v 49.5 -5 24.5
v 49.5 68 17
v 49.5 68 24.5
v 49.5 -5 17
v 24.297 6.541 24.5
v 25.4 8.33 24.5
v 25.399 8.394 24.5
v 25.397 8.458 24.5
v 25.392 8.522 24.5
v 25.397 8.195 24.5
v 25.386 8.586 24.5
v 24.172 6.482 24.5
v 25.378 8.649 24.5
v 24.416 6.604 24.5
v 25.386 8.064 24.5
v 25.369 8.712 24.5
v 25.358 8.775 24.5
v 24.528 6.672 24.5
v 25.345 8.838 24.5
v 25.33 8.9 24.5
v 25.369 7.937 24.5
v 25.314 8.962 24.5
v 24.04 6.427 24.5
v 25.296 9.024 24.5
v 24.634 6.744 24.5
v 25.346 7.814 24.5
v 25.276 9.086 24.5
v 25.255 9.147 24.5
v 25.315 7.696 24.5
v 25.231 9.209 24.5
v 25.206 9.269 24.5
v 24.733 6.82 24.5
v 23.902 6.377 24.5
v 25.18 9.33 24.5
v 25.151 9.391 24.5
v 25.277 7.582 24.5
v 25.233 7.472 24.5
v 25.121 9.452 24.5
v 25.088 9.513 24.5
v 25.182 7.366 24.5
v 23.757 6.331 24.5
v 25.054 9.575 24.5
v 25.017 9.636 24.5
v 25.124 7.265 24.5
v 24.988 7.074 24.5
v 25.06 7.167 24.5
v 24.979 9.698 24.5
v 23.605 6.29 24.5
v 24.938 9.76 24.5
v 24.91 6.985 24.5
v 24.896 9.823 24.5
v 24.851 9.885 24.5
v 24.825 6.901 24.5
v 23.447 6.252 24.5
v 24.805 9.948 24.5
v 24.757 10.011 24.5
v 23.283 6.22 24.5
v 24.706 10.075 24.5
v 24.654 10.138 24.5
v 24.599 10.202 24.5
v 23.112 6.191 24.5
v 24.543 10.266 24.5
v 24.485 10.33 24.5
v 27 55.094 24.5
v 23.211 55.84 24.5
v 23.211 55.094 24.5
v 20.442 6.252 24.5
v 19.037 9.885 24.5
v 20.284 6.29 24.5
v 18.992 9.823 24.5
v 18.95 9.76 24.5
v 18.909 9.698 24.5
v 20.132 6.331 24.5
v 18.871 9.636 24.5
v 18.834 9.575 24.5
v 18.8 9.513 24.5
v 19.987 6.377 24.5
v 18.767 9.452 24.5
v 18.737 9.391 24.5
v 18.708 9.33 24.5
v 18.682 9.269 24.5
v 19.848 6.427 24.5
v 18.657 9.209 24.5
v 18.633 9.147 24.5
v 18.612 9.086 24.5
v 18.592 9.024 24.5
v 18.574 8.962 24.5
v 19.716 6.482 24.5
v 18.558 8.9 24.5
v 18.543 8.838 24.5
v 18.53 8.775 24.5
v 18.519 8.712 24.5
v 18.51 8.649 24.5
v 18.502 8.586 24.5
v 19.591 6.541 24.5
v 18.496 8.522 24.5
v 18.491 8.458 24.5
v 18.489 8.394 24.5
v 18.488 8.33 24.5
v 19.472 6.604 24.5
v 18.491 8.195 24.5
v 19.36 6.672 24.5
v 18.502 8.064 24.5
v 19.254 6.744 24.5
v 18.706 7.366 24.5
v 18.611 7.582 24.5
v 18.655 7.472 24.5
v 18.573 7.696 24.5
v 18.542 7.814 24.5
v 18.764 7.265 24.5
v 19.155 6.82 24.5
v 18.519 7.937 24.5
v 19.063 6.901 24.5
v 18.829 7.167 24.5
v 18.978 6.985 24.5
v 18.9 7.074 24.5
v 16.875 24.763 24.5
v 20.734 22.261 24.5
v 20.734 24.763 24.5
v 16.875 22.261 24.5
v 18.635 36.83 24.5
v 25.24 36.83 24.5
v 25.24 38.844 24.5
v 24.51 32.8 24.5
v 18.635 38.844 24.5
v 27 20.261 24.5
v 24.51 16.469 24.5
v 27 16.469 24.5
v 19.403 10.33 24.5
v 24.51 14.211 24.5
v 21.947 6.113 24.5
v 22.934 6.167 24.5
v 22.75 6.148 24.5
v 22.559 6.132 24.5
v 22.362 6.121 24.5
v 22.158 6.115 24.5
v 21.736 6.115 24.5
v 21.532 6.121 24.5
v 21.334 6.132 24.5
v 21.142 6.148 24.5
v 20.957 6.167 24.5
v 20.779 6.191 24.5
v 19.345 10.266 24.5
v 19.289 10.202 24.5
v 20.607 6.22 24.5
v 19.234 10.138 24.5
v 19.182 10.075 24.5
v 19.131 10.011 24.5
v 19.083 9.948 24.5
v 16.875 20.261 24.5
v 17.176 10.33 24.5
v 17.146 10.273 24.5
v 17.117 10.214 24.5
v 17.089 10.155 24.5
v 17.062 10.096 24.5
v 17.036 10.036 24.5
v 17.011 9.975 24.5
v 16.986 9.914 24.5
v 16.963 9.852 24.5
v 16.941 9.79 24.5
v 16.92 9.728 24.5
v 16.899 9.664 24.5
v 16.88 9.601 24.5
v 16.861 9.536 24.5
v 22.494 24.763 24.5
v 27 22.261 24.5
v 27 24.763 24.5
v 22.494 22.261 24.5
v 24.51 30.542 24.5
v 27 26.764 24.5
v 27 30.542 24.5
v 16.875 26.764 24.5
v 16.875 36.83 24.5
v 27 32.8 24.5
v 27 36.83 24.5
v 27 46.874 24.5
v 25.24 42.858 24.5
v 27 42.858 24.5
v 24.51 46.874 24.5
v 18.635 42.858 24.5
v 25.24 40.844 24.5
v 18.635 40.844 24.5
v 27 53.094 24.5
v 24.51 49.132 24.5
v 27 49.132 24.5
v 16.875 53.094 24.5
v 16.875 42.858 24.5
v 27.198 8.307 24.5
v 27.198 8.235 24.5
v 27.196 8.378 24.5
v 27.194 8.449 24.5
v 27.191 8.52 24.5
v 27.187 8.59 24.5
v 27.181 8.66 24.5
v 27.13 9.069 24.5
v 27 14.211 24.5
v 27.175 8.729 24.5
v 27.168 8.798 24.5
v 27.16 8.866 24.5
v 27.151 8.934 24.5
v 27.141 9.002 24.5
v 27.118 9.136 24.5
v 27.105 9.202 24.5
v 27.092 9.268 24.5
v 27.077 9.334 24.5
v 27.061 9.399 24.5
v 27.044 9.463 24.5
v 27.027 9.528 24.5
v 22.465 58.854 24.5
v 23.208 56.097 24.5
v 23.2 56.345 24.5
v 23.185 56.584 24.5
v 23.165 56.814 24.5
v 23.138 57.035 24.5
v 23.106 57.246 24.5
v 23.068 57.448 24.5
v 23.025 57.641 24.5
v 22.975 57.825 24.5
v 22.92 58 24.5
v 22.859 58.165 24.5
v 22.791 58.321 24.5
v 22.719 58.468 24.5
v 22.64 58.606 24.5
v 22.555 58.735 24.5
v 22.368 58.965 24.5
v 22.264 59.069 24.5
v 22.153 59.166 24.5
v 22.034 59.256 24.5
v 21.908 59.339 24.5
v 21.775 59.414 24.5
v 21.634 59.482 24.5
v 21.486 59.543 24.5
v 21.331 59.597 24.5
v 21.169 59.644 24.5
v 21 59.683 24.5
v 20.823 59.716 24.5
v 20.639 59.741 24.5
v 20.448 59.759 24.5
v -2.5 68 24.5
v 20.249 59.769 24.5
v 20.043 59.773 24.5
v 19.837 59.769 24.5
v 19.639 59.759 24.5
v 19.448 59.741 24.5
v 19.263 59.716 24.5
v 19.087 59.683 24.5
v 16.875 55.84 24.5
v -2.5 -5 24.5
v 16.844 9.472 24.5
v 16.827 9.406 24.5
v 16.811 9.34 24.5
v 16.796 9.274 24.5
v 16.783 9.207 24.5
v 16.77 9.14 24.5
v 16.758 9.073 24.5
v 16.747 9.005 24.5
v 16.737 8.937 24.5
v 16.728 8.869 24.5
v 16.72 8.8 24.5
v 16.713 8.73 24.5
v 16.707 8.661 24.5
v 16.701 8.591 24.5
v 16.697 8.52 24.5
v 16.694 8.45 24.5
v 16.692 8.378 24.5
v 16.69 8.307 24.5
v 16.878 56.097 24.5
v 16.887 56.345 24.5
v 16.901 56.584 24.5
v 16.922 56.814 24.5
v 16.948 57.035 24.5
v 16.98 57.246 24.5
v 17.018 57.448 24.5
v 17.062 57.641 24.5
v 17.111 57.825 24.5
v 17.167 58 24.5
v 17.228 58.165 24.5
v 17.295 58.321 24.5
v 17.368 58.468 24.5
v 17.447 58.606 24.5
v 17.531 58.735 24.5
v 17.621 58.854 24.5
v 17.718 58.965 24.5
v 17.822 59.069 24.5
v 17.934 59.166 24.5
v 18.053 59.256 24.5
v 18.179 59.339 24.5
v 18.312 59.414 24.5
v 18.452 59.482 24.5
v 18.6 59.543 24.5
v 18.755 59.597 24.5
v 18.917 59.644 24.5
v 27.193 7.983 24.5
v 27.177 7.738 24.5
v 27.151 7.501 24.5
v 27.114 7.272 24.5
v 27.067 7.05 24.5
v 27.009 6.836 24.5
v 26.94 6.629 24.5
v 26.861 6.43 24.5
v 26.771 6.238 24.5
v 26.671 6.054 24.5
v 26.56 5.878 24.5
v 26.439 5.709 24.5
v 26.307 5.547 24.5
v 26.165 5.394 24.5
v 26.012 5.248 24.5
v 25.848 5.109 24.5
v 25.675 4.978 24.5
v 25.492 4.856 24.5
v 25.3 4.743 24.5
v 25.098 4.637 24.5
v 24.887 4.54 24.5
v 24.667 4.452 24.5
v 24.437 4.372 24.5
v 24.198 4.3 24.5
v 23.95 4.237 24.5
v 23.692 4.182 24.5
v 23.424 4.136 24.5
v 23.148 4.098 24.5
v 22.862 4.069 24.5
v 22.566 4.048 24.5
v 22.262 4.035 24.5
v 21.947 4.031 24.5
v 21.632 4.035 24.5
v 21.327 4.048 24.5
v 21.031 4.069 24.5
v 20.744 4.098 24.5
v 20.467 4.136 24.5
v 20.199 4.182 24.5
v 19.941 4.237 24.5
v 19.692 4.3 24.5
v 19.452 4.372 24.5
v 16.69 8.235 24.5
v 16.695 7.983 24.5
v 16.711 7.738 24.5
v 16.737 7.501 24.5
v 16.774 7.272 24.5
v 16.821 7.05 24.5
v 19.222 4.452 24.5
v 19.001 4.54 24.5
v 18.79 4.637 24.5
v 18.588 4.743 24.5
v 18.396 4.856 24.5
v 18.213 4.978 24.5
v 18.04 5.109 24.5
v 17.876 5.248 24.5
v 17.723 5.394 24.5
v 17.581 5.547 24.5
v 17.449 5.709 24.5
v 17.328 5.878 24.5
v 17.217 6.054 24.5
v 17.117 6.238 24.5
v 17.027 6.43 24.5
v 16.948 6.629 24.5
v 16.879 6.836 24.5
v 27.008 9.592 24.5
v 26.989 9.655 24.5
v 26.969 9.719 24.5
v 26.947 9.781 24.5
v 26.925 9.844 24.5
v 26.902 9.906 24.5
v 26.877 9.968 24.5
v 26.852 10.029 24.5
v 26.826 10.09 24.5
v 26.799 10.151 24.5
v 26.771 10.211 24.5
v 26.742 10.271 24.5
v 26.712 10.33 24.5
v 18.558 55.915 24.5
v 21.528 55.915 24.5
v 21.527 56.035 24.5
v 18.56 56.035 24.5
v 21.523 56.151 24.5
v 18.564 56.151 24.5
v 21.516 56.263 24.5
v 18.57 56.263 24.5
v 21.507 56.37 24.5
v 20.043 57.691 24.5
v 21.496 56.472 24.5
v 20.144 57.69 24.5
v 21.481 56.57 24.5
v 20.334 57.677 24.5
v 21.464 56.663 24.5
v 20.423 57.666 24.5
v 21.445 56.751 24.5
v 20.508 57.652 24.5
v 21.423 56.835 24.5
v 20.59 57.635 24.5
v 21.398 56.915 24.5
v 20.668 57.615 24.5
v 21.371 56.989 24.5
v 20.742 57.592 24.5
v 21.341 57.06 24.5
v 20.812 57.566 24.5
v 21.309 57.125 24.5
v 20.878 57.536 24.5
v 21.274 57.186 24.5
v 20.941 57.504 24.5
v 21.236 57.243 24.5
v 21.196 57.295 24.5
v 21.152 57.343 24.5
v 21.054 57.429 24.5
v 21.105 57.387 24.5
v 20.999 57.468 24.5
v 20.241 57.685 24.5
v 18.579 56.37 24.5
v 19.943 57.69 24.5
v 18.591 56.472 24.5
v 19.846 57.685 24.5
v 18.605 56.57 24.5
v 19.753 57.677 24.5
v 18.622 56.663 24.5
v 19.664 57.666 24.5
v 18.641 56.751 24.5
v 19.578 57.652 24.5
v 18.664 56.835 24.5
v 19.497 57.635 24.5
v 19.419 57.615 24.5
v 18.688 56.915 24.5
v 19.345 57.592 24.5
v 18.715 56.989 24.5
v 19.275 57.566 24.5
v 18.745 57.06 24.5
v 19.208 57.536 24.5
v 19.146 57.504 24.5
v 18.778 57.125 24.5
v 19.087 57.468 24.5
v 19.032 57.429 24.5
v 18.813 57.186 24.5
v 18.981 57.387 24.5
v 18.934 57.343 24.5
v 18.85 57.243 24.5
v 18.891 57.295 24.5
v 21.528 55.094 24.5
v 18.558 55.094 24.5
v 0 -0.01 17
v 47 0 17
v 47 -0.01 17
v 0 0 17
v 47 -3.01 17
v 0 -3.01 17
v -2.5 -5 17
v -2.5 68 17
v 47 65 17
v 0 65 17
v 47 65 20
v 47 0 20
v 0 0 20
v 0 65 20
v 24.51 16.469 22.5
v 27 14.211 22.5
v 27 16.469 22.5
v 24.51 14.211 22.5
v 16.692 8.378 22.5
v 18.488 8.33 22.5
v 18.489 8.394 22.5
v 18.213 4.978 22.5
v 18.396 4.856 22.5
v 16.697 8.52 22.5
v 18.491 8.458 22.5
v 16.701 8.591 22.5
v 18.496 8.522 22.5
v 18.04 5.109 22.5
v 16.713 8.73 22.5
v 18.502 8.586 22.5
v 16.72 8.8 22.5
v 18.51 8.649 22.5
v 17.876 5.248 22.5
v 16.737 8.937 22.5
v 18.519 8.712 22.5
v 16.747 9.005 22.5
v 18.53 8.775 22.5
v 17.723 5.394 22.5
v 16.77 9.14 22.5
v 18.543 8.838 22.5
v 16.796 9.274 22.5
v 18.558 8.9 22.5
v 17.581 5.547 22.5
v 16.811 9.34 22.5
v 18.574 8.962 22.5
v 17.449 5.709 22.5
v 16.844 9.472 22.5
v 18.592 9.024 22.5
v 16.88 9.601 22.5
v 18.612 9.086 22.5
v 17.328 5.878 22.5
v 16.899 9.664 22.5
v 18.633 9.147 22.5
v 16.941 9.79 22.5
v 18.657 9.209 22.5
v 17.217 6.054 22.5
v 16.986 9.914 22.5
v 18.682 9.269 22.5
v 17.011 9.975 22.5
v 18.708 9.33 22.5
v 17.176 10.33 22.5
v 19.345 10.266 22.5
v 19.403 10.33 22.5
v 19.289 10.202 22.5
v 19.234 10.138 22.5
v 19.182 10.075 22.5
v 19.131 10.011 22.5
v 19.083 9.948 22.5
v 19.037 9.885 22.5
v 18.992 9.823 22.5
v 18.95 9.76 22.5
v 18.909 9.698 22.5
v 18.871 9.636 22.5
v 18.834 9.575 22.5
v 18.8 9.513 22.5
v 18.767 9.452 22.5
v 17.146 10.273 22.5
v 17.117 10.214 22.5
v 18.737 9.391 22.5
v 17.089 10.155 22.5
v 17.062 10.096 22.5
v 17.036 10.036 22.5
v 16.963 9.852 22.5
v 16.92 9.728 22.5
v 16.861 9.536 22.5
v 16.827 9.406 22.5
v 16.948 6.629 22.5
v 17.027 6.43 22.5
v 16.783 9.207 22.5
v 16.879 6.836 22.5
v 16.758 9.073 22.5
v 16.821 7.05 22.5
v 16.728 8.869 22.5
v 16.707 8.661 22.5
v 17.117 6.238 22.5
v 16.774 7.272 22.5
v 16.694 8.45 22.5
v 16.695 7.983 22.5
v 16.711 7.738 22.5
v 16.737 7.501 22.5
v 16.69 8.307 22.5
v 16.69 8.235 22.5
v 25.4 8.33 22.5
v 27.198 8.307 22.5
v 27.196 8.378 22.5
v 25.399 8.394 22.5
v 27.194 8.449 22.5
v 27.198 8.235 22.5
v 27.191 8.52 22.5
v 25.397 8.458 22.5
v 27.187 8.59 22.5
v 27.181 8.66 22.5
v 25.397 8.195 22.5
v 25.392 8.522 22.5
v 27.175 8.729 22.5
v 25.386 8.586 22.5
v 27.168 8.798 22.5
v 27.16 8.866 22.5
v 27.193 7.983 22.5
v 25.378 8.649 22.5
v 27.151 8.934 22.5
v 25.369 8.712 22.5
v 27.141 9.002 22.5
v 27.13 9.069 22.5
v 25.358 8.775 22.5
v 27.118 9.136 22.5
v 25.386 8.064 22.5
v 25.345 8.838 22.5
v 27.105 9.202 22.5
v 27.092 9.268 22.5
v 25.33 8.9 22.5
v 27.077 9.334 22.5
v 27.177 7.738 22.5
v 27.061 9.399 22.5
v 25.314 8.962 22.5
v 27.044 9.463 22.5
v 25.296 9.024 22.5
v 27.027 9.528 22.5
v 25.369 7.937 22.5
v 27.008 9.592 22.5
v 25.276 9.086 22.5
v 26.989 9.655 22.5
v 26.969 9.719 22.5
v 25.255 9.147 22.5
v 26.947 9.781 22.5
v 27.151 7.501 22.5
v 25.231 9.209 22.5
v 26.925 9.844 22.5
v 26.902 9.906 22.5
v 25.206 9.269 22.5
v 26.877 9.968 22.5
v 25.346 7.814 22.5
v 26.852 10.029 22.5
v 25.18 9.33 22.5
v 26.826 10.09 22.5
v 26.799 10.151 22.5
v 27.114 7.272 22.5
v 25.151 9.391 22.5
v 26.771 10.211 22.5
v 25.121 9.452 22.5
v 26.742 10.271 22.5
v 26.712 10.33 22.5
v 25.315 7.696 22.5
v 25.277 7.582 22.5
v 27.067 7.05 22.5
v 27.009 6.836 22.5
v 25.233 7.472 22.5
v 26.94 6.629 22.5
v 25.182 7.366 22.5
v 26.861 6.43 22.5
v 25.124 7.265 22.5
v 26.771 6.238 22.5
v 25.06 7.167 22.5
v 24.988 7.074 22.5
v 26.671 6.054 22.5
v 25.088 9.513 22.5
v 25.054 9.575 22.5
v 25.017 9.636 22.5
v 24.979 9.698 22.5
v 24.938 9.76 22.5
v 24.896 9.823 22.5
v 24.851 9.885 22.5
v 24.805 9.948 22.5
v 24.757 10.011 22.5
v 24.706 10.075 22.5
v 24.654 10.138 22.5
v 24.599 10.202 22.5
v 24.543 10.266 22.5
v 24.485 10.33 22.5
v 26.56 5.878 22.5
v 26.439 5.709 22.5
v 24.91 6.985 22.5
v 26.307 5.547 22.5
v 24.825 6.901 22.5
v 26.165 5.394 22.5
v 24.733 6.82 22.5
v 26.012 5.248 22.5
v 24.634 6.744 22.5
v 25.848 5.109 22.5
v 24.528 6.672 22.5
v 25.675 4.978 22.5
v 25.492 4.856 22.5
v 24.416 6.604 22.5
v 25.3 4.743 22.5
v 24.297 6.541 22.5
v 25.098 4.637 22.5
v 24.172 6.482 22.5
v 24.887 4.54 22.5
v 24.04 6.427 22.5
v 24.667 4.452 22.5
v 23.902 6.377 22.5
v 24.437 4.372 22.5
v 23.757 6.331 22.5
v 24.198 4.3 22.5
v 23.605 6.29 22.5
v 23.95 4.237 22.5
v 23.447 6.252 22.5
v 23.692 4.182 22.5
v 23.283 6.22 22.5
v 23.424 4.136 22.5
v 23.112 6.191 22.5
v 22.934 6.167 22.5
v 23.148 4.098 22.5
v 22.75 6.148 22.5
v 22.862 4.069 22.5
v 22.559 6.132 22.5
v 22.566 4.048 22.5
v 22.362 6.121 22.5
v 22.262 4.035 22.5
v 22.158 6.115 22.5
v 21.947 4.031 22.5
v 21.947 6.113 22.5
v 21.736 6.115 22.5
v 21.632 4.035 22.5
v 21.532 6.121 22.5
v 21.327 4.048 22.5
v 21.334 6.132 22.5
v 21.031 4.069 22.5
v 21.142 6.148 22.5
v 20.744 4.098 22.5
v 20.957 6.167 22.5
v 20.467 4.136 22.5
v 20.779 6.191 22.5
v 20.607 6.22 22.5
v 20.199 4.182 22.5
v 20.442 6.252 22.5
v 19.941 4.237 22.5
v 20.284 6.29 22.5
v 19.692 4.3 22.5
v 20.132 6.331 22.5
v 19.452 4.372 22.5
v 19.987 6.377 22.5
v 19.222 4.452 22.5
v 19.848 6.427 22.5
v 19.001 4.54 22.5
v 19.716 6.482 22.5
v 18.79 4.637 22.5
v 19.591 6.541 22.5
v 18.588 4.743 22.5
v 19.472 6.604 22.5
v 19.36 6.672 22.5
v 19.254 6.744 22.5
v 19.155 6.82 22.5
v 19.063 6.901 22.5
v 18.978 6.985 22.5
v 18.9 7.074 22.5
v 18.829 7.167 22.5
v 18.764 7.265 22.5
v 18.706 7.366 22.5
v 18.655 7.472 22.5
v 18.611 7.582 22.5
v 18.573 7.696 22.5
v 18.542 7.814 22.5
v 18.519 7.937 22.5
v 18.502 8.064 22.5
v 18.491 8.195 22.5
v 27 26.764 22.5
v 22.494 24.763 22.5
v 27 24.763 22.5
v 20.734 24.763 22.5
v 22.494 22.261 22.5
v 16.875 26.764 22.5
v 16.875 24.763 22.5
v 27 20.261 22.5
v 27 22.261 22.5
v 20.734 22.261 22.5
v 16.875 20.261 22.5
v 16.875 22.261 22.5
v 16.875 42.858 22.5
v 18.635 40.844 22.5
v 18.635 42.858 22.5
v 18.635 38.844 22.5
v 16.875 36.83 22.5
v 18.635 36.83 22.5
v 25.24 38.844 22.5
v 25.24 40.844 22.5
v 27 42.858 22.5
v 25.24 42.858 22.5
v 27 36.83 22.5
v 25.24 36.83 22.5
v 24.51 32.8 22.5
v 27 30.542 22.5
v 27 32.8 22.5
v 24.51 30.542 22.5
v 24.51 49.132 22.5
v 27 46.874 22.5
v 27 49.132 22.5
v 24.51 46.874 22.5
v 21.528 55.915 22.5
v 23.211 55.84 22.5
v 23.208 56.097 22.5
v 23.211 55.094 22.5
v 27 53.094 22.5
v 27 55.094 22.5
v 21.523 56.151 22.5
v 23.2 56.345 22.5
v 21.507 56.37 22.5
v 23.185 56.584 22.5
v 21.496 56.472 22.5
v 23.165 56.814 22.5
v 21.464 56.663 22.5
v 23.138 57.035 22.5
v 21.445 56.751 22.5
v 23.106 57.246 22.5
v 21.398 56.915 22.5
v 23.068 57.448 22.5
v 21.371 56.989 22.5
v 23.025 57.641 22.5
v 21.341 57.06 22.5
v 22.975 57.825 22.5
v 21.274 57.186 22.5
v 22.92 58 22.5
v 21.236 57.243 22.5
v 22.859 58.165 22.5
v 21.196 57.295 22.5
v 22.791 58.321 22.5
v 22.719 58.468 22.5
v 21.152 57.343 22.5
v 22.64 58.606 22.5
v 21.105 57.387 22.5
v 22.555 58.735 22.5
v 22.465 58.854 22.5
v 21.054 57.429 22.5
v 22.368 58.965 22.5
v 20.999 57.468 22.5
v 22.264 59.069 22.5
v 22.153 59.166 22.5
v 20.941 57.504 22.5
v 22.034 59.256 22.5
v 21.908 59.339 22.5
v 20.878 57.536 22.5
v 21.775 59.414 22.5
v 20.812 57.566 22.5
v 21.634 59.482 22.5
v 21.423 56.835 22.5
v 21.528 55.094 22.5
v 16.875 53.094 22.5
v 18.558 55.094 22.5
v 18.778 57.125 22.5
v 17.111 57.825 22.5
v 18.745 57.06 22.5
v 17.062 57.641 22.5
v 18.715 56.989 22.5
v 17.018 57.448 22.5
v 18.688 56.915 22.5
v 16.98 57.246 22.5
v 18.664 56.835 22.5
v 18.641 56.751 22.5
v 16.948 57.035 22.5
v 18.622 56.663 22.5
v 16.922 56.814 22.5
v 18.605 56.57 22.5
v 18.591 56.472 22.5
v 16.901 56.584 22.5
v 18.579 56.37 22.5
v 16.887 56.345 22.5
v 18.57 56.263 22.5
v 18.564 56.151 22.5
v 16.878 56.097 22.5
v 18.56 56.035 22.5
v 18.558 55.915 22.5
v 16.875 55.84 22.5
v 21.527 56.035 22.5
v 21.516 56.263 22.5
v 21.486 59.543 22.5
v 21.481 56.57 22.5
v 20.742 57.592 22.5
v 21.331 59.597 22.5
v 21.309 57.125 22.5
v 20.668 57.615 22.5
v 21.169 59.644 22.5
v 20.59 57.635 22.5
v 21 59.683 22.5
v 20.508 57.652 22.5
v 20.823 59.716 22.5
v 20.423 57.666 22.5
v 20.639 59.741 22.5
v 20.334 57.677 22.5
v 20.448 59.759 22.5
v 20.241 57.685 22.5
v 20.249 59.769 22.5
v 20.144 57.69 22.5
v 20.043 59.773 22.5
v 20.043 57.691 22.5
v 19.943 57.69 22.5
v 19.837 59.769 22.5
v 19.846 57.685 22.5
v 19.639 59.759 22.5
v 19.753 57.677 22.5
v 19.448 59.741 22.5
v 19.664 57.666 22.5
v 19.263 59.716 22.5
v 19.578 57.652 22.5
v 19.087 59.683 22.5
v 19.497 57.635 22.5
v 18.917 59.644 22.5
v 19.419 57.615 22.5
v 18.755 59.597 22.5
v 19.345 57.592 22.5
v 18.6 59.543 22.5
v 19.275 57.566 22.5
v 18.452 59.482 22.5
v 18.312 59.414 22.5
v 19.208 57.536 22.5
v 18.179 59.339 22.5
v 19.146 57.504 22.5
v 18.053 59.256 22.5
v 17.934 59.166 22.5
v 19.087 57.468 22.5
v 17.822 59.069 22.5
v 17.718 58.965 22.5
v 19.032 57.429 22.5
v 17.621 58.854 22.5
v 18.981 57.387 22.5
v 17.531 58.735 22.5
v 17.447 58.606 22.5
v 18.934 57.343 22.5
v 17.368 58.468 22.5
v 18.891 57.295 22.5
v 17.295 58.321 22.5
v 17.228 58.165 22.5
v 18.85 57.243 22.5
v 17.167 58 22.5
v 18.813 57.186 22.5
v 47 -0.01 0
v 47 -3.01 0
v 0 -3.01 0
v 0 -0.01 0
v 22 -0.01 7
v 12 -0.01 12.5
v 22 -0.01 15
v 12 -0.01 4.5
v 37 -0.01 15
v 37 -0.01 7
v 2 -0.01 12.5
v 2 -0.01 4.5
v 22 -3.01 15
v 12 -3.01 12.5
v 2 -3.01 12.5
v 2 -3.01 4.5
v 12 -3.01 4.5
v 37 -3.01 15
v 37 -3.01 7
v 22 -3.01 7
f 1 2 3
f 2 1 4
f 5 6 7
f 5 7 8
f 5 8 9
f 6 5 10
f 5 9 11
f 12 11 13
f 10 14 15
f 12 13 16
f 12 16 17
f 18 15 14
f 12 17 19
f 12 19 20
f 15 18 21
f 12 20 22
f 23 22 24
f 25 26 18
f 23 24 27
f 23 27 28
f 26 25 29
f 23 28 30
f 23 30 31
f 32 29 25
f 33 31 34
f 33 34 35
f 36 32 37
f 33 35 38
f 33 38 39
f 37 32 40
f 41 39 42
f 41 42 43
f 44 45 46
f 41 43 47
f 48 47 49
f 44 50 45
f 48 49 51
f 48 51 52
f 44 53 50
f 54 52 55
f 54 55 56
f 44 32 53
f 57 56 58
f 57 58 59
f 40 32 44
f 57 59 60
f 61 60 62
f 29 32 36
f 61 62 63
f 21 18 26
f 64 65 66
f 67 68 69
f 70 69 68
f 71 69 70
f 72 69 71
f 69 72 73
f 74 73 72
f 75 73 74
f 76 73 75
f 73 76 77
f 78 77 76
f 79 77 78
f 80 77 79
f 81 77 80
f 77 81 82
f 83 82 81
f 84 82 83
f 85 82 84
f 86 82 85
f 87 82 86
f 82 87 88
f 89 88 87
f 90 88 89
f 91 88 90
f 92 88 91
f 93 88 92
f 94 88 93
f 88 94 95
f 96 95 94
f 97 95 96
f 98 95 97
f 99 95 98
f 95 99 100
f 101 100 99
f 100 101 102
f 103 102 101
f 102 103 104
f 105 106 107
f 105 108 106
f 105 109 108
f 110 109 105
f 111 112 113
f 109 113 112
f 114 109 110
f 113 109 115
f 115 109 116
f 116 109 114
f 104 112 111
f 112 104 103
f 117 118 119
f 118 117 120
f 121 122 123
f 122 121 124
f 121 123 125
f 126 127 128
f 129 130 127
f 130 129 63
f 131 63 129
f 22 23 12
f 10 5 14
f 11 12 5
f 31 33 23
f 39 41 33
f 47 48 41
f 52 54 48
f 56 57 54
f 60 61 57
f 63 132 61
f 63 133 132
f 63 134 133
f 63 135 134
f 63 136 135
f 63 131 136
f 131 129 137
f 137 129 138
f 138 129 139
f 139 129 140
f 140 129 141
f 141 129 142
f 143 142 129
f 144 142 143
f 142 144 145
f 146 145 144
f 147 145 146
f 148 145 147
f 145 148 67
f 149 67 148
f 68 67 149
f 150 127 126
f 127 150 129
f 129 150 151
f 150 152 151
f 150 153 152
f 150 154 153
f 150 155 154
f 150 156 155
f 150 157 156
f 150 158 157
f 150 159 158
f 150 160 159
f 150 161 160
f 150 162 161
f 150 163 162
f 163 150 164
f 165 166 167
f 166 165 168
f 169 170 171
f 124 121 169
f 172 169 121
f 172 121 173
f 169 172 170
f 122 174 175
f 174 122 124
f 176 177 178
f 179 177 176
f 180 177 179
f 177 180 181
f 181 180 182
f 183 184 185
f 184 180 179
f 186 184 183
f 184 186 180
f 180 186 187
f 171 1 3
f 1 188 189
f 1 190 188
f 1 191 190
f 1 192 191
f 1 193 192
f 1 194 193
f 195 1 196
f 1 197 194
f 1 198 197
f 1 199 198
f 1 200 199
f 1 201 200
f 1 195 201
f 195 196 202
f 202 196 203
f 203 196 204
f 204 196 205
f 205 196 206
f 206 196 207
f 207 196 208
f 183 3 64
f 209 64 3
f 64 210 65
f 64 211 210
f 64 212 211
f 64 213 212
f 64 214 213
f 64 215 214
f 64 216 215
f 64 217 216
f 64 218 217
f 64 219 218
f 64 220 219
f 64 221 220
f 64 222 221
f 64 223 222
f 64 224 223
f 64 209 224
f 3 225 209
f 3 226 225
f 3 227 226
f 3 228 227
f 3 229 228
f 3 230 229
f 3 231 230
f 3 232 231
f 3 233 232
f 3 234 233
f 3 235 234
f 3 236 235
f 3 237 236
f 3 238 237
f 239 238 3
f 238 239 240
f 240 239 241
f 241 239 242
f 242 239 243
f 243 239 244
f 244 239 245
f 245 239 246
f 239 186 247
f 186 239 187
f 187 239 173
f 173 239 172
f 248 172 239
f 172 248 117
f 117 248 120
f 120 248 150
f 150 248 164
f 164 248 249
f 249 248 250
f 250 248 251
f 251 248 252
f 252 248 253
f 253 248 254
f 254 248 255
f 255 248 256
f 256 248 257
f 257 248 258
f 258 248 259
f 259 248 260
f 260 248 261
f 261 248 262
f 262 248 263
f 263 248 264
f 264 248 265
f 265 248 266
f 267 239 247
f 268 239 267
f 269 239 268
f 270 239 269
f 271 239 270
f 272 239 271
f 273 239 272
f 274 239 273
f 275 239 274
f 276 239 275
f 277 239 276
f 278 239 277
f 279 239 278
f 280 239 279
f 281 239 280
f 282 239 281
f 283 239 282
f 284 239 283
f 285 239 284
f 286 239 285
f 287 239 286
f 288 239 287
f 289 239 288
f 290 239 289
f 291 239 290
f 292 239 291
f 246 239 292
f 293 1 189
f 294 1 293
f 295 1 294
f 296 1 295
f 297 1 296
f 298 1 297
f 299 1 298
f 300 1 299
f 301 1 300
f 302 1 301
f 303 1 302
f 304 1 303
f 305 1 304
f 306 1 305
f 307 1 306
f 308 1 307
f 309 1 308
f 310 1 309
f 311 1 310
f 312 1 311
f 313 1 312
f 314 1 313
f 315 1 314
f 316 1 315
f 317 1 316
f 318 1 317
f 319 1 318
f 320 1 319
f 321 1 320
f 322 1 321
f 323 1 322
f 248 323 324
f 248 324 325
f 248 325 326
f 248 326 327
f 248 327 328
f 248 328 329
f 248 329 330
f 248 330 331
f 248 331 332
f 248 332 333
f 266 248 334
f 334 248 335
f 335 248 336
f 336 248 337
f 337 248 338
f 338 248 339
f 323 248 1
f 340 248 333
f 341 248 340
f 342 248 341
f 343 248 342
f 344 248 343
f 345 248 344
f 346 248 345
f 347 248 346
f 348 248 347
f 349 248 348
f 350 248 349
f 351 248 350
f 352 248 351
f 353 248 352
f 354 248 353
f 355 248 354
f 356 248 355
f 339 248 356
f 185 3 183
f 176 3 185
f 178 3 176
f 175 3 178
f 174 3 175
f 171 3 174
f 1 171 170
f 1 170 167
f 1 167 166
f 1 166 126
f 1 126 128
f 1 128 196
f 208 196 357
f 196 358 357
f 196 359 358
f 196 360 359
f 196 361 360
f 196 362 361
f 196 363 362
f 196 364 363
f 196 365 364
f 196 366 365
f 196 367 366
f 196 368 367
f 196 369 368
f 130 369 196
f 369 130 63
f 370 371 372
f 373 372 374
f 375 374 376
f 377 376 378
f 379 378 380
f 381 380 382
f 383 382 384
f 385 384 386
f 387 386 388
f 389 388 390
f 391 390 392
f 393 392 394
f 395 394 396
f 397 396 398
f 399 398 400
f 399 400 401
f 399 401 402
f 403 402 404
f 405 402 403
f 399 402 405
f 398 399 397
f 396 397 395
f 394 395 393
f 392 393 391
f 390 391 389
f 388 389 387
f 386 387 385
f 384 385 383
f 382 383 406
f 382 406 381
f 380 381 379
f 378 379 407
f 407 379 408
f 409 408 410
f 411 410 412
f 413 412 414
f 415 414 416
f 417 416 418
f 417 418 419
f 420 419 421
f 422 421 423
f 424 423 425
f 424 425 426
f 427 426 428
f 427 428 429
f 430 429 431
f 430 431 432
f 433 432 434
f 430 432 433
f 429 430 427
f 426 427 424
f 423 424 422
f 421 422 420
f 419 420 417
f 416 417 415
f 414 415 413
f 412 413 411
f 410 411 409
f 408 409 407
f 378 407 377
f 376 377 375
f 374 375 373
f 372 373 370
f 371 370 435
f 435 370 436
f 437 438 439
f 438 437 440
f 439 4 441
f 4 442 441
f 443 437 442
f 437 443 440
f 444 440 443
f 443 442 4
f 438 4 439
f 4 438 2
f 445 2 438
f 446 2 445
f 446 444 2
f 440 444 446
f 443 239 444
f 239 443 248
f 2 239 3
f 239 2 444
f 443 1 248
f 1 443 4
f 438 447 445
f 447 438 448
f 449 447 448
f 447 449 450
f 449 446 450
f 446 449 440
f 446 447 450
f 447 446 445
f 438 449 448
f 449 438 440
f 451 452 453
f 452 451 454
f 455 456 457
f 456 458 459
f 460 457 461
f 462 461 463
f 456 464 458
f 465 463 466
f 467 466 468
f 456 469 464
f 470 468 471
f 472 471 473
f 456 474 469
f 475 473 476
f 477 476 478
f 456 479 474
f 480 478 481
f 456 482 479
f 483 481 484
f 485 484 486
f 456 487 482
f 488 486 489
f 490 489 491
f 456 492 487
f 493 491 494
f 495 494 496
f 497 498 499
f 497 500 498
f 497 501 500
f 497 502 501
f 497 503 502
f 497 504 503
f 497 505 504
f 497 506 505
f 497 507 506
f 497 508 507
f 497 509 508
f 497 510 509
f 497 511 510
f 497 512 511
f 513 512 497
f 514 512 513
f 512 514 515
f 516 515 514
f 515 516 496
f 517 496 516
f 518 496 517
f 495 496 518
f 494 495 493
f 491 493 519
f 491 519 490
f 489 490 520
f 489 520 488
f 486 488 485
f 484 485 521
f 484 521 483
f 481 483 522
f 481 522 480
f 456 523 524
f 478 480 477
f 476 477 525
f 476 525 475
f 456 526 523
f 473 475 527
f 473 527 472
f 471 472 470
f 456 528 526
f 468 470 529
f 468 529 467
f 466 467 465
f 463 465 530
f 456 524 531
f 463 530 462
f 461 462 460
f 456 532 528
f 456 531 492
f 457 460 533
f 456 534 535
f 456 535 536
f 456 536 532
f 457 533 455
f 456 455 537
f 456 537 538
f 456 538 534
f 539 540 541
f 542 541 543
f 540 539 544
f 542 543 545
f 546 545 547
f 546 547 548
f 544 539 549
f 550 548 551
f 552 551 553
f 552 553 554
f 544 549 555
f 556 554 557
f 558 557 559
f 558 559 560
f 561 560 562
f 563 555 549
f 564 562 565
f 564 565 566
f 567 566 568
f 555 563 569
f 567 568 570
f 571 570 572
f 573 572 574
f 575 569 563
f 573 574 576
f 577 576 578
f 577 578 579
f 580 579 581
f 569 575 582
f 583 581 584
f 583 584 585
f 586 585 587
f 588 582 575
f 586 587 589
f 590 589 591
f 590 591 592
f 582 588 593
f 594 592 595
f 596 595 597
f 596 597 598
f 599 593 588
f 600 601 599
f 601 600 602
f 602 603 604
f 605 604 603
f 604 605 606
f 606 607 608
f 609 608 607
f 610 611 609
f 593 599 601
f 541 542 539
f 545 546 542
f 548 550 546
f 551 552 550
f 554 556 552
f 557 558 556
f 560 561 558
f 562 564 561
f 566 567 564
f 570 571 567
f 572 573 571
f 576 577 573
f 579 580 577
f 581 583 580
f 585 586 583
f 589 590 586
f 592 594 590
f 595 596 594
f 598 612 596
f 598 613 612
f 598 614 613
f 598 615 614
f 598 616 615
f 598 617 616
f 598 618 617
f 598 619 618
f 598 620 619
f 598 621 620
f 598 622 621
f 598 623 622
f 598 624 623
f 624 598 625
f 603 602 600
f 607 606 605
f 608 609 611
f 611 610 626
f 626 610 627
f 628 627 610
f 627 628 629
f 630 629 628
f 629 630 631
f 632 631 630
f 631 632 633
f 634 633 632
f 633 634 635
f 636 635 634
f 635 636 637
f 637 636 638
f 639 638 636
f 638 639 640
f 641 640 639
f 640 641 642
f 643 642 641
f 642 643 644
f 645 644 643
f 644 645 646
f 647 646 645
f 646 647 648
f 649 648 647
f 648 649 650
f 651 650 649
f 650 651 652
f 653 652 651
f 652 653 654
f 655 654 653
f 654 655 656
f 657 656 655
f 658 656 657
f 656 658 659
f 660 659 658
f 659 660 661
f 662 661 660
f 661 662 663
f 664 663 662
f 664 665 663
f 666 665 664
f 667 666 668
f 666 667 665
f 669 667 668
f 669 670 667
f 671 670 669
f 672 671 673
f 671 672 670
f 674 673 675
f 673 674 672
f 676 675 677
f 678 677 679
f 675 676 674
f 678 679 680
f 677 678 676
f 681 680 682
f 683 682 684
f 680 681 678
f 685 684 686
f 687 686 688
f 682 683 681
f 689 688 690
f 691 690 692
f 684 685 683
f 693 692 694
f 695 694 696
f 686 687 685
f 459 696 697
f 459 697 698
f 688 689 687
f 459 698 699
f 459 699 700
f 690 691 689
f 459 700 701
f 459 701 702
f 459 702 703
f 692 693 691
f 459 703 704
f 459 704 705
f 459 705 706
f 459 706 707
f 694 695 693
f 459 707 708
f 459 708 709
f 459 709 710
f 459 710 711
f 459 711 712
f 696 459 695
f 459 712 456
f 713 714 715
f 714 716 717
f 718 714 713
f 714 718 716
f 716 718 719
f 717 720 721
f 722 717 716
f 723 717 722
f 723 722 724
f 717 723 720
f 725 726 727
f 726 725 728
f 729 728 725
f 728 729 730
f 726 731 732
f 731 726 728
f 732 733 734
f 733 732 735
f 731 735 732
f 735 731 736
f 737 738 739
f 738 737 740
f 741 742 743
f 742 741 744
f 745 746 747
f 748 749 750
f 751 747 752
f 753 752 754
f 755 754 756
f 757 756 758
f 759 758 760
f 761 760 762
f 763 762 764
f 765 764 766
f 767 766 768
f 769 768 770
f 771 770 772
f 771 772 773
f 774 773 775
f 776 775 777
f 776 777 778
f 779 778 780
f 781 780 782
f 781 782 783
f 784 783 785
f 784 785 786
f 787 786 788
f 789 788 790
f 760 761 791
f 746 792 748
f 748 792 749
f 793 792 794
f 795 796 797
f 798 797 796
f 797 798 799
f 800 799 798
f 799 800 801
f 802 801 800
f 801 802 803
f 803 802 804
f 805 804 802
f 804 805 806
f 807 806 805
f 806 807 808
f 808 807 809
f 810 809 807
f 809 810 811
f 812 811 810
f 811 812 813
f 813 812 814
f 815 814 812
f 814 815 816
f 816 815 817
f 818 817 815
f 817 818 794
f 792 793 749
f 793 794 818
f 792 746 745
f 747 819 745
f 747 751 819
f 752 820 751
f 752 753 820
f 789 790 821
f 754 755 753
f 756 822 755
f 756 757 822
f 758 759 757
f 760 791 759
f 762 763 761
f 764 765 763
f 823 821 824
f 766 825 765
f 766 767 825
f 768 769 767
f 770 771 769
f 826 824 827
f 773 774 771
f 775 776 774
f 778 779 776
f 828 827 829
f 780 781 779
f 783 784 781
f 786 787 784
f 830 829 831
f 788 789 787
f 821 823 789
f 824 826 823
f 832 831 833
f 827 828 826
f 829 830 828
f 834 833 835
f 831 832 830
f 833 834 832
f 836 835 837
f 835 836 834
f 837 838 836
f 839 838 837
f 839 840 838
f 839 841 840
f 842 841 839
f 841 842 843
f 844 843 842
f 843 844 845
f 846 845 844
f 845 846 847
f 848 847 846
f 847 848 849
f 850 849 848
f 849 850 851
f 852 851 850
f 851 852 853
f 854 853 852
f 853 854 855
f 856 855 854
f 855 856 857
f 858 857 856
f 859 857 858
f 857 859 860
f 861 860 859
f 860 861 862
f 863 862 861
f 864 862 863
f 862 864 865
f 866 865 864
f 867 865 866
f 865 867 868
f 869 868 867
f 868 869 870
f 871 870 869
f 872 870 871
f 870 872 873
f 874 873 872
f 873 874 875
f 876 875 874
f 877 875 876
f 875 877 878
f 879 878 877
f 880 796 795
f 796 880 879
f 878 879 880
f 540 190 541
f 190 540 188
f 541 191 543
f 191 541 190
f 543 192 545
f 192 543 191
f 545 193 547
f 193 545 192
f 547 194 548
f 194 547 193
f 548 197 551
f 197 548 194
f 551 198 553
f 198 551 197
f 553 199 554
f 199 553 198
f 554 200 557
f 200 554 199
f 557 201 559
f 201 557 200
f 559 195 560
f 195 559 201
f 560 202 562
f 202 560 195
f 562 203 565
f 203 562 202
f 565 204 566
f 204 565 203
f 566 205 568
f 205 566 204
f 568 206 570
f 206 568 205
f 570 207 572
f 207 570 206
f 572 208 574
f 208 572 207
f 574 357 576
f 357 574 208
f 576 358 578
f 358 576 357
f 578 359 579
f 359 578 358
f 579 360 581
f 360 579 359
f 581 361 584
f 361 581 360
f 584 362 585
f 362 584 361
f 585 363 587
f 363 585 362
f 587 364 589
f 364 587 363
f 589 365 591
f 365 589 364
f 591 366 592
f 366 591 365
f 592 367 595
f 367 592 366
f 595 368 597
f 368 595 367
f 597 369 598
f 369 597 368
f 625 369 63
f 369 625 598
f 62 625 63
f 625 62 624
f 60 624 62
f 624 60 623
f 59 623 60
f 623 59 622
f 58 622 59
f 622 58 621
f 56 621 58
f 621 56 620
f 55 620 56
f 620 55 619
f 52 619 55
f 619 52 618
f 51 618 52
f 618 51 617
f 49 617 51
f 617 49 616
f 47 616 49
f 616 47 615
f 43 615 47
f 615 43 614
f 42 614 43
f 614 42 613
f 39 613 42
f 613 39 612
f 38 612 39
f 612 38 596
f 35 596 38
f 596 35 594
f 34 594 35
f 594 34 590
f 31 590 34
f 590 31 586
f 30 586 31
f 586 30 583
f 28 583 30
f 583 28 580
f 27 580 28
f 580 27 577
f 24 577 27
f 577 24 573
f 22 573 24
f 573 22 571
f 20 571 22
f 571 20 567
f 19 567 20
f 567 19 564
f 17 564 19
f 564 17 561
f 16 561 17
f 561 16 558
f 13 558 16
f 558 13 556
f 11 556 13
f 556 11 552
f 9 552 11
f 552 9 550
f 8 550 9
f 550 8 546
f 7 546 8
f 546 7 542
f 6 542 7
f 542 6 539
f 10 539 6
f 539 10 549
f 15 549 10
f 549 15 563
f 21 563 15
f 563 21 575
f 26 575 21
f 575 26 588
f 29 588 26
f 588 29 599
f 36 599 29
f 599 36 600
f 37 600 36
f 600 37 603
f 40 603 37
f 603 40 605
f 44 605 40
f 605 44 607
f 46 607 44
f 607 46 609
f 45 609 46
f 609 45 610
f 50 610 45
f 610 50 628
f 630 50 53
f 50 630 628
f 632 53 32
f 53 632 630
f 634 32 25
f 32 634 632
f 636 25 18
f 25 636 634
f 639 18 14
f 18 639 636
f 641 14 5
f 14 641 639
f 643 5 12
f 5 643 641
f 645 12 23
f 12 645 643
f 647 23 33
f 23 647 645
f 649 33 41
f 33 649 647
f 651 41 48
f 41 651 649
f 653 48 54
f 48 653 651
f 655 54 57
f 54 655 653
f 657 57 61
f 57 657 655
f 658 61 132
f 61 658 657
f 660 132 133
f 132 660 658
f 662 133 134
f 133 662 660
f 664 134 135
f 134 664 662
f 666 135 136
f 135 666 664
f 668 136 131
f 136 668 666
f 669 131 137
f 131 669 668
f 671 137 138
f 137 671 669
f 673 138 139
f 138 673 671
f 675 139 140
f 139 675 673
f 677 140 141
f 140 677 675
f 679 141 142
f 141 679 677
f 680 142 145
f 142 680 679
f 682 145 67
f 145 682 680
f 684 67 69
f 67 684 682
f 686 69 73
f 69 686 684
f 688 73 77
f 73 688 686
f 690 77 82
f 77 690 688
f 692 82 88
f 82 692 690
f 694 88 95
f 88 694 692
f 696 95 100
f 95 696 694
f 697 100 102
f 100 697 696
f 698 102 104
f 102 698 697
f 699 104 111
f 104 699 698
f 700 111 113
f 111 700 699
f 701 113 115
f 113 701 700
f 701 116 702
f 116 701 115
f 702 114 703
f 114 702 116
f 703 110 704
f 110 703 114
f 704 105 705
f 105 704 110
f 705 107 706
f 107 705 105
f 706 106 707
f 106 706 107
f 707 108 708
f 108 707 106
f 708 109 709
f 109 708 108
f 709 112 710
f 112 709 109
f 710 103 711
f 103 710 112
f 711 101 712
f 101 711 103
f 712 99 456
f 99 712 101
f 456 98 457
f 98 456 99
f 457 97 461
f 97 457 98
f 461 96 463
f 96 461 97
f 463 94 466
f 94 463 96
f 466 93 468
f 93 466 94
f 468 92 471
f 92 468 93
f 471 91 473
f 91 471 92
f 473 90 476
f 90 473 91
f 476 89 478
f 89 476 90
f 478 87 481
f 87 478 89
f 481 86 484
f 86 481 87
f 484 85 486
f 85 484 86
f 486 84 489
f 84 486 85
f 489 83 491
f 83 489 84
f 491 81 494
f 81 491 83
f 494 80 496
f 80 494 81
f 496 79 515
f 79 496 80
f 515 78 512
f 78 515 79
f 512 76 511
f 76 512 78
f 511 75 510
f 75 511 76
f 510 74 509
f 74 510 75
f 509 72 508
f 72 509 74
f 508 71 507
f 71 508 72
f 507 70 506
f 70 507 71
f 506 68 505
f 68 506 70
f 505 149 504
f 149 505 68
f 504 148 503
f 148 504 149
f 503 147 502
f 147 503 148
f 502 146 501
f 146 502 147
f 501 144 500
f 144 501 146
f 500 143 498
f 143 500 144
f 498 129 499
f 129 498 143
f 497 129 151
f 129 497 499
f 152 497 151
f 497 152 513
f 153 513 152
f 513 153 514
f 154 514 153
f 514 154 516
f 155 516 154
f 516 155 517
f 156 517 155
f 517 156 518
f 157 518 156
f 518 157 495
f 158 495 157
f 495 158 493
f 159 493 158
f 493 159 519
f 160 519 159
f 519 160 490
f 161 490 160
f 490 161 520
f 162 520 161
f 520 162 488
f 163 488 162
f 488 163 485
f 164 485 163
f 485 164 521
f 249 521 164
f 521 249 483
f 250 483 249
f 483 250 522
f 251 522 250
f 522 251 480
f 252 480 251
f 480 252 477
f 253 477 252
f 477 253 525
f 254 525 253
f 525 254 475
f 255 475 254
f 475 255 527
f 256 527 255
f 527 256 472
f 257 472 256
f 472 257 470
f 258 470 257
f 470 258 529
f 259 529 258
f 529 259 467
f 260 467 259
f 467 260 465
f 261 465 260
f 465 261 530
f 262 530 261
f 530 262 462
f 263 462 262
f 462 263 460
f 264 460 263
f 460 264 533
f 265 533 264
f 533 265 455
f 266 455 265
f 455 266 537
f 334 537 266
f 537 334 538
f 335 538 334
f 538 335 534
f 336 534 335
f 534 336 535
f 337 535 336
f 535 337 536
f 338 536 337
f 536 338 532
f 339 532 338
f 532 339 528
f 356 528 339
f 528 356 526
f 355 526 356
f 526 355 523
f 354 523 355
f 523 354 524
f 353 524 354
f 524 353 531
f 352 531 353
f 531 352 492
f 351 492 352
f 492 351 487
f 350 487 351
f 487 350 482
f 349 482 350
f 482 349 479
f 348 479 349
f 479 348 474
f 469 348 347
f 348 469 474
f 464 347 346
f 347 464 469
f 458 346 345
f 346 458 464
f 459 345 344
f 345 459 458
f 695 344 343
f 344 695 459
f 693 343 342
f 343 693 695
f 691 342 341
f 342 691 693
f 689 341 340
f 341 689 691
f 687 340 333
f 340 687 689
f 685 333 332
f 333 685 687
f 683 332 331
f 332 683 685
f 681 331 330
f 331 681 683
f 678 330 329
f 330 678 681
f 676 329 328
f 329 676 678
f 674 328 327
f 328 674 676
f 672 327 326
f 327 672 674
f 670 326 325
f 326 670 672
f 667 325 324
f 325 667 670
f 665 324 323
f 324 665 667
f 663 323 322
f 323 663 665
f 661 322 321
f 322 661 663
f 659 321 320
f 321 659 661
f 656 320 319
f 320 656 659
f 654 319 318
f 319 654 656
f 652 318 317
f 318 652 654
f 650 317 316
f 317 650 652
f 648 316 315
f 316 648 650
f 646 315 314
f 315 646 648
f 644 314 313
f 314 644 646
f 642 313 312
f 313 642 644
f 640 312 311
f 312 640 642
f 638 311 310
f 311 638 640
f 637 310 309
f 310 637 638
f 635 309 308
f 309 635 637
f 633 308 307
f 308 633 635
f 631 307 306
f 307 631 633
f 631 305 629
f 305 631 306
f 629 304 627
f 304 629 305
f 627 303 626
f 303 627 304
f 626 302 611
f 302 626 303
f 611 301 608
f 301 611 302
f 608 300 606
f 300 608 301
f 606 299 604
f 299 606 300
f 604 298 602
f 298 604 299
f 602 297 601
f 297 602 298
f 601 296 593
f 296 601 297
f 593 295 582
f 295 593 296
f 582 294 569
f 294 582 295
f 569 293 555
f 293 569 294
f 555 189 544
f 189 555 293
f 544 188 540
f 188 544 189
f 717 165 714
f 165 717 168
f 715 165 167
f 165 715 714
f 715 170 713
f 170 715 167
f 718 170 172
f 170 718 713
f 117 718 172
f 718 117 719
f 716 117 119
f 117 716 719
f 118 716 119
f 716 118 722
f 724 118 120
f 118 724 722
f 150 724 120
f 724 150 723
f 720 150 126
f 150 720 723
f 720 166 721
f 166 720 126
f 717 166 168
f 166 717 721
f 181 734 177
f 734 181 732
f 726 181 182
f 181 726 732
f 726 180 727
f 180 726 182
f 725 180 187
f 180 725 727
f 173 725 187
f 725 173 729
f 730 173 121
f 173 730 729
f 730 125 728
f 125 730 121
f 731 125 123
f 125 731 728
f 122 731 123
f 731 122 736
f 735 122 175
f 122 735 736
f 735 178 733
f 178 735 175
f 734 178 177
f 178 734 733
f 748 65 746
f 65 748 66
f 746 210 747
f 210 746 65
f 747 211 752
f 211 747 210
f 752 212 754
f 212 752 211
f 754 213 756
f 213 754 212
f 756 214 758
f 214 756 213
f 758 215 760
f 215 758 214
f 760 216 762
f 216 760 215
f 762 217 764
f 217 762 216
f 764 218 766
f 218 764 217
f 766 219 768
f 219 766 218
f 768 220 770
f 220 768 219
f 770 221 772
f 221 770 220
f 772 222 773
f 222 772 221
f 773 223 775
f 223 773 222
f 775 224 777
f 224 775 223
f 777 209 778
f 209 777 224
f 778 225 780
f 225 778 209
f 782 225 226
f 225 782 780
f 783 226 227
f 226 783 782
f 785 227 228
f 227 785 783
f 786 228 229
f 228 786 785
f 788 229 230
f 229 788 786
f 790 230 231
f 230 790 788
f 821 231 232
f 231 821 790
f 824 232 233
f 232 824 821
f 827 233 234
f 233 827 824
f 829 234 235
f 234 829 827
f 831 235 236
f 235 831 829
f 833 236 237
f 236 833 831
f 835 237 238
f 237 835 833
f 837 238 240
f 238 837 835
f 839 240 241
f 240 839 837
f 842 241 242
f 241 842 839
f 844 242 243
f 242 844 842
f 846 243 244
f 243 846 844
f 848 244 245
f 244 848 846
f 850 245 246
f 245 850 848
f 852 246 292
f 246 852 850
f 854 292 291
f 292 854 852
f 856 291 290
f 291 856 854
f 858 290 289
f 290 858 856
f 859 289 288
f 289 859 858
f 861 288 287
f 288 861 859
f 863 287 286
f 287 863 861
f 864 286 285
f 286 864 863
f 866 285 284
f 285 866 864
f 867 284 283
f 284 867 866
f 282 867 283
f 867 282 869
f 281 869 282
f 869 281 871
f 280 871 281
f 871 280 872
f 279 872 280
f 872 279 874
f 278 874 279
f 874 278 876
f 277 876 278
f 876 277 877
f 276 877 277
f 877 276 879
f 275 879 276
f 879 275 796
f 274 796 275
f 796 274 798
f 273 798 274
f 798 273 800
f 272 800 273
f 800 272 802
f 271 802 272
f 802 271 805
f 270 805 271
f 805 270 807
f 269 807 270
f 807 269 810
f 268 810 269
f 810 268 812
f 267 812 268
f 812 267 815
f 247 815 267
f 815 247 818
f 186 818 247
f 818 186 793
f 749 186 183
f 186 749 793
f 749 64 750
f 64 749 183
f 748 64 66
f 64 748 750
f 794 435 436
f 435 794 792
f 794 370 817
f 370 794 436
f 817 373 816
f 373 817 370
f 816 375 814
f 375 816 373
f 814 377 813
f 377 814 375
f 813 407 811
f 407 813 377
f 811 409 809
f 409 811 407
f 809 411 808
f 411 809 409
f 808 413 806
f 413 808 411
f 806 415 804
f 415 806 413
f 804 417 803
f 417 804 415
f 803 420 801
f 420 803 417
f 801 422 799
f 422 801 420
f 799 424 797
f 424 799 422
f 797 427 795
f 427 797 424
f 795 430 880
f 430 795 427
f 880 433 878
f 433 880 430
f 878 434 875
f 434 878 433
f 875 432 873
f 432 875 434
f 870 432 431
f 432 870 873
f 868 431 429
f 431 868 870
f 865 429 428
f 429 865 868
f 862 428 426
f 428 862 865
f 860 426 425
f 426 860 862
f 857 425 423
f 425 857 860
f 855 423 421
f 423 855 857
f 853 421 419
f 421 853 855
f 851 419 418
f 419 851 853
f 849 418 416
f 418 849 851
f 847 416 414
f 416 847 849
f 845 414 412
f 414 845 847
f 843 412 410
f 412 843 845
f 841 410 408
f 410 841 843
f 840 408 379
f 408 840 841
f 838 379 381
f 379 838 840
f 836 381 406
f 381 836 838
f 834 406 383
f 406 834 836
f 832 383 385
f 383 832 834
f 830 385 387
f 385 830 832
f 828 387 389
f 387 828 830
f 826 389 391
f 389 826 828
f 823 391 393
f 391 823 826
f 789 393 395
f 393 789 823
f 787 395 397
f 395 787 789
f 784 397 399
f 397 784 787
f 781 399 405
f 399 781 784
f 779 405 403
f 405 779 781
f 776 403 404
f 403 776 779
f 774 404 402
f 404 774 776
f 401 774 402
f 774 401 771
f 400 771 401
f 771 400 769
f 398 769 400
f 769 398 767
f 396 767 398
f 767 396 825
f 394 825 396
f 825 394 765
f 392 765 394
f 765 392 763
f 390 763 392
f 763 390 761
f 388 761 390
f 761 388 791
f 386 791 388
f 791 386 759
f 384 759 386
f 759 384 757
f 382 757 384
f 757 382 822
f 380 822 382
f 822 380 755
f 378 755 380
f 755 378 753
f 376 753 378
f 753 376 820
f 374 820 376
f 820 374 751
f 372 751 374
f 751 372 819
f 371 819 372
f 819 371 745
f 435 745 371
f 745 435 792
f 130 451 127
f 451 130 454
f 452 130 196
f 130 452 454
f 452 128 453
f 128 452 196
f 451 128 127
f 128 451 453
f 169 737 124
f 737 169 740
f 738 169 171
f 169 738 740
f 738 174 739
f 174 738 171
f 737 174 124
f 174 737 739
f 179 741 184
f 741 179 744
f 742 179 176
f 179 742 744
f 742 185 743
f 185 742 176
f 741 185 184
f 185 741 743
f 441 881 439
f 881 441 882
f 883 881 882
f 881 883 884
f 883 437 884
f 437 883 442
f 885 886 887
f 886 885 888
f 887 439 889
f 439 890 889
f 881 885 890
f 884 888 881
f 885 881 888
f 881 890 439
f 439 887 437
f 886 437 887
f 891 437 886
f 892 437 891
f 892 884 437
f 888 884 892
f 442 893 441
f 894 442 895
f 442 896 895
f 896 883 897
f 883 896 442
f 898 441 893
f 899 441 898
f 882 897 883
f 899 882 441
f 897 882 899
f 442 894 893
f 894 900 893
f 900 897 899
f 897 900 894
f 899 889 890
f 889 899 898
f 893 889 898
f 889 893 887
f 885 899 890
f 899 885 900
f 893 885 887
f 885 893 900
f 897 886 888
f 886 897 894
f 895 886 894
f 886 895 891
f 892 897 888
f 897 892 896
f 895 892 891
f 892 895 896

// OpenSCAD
// Chip width: 42mm
// Chip length: 62mm
// Chip height: 13mm


label="C.H.I.P";
hole_radius=0; // [0,3]

/* [Hidden] */
$fa=.5;
$fs=.5;
case_width=42;
case_length=62;
case_height=15;
wall=2;
air_gap=3;


//Draw the box lid
module lid()
{
    difference()
    {
        translate([-wall - .5, -wall - 3, case_height + wall])
            cube([case_width + wall * 4 + 2, case_length + wall * 4 + 3, case_height/2]);
        translate([0,0,0])
             cube([case_width + wall*2 + 1, case_length + wall + 1, case_height + wall + air_gap]);
     translate([case_width/2 + 6, 3, case_height * 1.5 + wall - 2])
        rotate([0,0,90])
            linear_extrude(3) text(label, font="DejaVu Sans Mono:style=Bold");
    }
}

module face()
{
    difference()
    // 8 x 15 for the usb
    // up 7 from bottom plane
    //inset 9 from left of bottom case
    {
        translate([0, -wall - 1.01, 0])
           
        cube([case_width + wall * 2 + 1, wall + 1, case_height + wall]);
        translate([case_width + wall * 2 - 24, -wall - 1.02, 7])
            cube([15, wall +1.04, 8]);
        translate([17, 0, 10])
            rotate([90,0,0])
                cylinder(r=hole_radius, h=wall*2);
        translate([wall, -wall - 2, 4.5])
            cube([10, wall * 2, 8]); 


    }
}
lid();
face();
